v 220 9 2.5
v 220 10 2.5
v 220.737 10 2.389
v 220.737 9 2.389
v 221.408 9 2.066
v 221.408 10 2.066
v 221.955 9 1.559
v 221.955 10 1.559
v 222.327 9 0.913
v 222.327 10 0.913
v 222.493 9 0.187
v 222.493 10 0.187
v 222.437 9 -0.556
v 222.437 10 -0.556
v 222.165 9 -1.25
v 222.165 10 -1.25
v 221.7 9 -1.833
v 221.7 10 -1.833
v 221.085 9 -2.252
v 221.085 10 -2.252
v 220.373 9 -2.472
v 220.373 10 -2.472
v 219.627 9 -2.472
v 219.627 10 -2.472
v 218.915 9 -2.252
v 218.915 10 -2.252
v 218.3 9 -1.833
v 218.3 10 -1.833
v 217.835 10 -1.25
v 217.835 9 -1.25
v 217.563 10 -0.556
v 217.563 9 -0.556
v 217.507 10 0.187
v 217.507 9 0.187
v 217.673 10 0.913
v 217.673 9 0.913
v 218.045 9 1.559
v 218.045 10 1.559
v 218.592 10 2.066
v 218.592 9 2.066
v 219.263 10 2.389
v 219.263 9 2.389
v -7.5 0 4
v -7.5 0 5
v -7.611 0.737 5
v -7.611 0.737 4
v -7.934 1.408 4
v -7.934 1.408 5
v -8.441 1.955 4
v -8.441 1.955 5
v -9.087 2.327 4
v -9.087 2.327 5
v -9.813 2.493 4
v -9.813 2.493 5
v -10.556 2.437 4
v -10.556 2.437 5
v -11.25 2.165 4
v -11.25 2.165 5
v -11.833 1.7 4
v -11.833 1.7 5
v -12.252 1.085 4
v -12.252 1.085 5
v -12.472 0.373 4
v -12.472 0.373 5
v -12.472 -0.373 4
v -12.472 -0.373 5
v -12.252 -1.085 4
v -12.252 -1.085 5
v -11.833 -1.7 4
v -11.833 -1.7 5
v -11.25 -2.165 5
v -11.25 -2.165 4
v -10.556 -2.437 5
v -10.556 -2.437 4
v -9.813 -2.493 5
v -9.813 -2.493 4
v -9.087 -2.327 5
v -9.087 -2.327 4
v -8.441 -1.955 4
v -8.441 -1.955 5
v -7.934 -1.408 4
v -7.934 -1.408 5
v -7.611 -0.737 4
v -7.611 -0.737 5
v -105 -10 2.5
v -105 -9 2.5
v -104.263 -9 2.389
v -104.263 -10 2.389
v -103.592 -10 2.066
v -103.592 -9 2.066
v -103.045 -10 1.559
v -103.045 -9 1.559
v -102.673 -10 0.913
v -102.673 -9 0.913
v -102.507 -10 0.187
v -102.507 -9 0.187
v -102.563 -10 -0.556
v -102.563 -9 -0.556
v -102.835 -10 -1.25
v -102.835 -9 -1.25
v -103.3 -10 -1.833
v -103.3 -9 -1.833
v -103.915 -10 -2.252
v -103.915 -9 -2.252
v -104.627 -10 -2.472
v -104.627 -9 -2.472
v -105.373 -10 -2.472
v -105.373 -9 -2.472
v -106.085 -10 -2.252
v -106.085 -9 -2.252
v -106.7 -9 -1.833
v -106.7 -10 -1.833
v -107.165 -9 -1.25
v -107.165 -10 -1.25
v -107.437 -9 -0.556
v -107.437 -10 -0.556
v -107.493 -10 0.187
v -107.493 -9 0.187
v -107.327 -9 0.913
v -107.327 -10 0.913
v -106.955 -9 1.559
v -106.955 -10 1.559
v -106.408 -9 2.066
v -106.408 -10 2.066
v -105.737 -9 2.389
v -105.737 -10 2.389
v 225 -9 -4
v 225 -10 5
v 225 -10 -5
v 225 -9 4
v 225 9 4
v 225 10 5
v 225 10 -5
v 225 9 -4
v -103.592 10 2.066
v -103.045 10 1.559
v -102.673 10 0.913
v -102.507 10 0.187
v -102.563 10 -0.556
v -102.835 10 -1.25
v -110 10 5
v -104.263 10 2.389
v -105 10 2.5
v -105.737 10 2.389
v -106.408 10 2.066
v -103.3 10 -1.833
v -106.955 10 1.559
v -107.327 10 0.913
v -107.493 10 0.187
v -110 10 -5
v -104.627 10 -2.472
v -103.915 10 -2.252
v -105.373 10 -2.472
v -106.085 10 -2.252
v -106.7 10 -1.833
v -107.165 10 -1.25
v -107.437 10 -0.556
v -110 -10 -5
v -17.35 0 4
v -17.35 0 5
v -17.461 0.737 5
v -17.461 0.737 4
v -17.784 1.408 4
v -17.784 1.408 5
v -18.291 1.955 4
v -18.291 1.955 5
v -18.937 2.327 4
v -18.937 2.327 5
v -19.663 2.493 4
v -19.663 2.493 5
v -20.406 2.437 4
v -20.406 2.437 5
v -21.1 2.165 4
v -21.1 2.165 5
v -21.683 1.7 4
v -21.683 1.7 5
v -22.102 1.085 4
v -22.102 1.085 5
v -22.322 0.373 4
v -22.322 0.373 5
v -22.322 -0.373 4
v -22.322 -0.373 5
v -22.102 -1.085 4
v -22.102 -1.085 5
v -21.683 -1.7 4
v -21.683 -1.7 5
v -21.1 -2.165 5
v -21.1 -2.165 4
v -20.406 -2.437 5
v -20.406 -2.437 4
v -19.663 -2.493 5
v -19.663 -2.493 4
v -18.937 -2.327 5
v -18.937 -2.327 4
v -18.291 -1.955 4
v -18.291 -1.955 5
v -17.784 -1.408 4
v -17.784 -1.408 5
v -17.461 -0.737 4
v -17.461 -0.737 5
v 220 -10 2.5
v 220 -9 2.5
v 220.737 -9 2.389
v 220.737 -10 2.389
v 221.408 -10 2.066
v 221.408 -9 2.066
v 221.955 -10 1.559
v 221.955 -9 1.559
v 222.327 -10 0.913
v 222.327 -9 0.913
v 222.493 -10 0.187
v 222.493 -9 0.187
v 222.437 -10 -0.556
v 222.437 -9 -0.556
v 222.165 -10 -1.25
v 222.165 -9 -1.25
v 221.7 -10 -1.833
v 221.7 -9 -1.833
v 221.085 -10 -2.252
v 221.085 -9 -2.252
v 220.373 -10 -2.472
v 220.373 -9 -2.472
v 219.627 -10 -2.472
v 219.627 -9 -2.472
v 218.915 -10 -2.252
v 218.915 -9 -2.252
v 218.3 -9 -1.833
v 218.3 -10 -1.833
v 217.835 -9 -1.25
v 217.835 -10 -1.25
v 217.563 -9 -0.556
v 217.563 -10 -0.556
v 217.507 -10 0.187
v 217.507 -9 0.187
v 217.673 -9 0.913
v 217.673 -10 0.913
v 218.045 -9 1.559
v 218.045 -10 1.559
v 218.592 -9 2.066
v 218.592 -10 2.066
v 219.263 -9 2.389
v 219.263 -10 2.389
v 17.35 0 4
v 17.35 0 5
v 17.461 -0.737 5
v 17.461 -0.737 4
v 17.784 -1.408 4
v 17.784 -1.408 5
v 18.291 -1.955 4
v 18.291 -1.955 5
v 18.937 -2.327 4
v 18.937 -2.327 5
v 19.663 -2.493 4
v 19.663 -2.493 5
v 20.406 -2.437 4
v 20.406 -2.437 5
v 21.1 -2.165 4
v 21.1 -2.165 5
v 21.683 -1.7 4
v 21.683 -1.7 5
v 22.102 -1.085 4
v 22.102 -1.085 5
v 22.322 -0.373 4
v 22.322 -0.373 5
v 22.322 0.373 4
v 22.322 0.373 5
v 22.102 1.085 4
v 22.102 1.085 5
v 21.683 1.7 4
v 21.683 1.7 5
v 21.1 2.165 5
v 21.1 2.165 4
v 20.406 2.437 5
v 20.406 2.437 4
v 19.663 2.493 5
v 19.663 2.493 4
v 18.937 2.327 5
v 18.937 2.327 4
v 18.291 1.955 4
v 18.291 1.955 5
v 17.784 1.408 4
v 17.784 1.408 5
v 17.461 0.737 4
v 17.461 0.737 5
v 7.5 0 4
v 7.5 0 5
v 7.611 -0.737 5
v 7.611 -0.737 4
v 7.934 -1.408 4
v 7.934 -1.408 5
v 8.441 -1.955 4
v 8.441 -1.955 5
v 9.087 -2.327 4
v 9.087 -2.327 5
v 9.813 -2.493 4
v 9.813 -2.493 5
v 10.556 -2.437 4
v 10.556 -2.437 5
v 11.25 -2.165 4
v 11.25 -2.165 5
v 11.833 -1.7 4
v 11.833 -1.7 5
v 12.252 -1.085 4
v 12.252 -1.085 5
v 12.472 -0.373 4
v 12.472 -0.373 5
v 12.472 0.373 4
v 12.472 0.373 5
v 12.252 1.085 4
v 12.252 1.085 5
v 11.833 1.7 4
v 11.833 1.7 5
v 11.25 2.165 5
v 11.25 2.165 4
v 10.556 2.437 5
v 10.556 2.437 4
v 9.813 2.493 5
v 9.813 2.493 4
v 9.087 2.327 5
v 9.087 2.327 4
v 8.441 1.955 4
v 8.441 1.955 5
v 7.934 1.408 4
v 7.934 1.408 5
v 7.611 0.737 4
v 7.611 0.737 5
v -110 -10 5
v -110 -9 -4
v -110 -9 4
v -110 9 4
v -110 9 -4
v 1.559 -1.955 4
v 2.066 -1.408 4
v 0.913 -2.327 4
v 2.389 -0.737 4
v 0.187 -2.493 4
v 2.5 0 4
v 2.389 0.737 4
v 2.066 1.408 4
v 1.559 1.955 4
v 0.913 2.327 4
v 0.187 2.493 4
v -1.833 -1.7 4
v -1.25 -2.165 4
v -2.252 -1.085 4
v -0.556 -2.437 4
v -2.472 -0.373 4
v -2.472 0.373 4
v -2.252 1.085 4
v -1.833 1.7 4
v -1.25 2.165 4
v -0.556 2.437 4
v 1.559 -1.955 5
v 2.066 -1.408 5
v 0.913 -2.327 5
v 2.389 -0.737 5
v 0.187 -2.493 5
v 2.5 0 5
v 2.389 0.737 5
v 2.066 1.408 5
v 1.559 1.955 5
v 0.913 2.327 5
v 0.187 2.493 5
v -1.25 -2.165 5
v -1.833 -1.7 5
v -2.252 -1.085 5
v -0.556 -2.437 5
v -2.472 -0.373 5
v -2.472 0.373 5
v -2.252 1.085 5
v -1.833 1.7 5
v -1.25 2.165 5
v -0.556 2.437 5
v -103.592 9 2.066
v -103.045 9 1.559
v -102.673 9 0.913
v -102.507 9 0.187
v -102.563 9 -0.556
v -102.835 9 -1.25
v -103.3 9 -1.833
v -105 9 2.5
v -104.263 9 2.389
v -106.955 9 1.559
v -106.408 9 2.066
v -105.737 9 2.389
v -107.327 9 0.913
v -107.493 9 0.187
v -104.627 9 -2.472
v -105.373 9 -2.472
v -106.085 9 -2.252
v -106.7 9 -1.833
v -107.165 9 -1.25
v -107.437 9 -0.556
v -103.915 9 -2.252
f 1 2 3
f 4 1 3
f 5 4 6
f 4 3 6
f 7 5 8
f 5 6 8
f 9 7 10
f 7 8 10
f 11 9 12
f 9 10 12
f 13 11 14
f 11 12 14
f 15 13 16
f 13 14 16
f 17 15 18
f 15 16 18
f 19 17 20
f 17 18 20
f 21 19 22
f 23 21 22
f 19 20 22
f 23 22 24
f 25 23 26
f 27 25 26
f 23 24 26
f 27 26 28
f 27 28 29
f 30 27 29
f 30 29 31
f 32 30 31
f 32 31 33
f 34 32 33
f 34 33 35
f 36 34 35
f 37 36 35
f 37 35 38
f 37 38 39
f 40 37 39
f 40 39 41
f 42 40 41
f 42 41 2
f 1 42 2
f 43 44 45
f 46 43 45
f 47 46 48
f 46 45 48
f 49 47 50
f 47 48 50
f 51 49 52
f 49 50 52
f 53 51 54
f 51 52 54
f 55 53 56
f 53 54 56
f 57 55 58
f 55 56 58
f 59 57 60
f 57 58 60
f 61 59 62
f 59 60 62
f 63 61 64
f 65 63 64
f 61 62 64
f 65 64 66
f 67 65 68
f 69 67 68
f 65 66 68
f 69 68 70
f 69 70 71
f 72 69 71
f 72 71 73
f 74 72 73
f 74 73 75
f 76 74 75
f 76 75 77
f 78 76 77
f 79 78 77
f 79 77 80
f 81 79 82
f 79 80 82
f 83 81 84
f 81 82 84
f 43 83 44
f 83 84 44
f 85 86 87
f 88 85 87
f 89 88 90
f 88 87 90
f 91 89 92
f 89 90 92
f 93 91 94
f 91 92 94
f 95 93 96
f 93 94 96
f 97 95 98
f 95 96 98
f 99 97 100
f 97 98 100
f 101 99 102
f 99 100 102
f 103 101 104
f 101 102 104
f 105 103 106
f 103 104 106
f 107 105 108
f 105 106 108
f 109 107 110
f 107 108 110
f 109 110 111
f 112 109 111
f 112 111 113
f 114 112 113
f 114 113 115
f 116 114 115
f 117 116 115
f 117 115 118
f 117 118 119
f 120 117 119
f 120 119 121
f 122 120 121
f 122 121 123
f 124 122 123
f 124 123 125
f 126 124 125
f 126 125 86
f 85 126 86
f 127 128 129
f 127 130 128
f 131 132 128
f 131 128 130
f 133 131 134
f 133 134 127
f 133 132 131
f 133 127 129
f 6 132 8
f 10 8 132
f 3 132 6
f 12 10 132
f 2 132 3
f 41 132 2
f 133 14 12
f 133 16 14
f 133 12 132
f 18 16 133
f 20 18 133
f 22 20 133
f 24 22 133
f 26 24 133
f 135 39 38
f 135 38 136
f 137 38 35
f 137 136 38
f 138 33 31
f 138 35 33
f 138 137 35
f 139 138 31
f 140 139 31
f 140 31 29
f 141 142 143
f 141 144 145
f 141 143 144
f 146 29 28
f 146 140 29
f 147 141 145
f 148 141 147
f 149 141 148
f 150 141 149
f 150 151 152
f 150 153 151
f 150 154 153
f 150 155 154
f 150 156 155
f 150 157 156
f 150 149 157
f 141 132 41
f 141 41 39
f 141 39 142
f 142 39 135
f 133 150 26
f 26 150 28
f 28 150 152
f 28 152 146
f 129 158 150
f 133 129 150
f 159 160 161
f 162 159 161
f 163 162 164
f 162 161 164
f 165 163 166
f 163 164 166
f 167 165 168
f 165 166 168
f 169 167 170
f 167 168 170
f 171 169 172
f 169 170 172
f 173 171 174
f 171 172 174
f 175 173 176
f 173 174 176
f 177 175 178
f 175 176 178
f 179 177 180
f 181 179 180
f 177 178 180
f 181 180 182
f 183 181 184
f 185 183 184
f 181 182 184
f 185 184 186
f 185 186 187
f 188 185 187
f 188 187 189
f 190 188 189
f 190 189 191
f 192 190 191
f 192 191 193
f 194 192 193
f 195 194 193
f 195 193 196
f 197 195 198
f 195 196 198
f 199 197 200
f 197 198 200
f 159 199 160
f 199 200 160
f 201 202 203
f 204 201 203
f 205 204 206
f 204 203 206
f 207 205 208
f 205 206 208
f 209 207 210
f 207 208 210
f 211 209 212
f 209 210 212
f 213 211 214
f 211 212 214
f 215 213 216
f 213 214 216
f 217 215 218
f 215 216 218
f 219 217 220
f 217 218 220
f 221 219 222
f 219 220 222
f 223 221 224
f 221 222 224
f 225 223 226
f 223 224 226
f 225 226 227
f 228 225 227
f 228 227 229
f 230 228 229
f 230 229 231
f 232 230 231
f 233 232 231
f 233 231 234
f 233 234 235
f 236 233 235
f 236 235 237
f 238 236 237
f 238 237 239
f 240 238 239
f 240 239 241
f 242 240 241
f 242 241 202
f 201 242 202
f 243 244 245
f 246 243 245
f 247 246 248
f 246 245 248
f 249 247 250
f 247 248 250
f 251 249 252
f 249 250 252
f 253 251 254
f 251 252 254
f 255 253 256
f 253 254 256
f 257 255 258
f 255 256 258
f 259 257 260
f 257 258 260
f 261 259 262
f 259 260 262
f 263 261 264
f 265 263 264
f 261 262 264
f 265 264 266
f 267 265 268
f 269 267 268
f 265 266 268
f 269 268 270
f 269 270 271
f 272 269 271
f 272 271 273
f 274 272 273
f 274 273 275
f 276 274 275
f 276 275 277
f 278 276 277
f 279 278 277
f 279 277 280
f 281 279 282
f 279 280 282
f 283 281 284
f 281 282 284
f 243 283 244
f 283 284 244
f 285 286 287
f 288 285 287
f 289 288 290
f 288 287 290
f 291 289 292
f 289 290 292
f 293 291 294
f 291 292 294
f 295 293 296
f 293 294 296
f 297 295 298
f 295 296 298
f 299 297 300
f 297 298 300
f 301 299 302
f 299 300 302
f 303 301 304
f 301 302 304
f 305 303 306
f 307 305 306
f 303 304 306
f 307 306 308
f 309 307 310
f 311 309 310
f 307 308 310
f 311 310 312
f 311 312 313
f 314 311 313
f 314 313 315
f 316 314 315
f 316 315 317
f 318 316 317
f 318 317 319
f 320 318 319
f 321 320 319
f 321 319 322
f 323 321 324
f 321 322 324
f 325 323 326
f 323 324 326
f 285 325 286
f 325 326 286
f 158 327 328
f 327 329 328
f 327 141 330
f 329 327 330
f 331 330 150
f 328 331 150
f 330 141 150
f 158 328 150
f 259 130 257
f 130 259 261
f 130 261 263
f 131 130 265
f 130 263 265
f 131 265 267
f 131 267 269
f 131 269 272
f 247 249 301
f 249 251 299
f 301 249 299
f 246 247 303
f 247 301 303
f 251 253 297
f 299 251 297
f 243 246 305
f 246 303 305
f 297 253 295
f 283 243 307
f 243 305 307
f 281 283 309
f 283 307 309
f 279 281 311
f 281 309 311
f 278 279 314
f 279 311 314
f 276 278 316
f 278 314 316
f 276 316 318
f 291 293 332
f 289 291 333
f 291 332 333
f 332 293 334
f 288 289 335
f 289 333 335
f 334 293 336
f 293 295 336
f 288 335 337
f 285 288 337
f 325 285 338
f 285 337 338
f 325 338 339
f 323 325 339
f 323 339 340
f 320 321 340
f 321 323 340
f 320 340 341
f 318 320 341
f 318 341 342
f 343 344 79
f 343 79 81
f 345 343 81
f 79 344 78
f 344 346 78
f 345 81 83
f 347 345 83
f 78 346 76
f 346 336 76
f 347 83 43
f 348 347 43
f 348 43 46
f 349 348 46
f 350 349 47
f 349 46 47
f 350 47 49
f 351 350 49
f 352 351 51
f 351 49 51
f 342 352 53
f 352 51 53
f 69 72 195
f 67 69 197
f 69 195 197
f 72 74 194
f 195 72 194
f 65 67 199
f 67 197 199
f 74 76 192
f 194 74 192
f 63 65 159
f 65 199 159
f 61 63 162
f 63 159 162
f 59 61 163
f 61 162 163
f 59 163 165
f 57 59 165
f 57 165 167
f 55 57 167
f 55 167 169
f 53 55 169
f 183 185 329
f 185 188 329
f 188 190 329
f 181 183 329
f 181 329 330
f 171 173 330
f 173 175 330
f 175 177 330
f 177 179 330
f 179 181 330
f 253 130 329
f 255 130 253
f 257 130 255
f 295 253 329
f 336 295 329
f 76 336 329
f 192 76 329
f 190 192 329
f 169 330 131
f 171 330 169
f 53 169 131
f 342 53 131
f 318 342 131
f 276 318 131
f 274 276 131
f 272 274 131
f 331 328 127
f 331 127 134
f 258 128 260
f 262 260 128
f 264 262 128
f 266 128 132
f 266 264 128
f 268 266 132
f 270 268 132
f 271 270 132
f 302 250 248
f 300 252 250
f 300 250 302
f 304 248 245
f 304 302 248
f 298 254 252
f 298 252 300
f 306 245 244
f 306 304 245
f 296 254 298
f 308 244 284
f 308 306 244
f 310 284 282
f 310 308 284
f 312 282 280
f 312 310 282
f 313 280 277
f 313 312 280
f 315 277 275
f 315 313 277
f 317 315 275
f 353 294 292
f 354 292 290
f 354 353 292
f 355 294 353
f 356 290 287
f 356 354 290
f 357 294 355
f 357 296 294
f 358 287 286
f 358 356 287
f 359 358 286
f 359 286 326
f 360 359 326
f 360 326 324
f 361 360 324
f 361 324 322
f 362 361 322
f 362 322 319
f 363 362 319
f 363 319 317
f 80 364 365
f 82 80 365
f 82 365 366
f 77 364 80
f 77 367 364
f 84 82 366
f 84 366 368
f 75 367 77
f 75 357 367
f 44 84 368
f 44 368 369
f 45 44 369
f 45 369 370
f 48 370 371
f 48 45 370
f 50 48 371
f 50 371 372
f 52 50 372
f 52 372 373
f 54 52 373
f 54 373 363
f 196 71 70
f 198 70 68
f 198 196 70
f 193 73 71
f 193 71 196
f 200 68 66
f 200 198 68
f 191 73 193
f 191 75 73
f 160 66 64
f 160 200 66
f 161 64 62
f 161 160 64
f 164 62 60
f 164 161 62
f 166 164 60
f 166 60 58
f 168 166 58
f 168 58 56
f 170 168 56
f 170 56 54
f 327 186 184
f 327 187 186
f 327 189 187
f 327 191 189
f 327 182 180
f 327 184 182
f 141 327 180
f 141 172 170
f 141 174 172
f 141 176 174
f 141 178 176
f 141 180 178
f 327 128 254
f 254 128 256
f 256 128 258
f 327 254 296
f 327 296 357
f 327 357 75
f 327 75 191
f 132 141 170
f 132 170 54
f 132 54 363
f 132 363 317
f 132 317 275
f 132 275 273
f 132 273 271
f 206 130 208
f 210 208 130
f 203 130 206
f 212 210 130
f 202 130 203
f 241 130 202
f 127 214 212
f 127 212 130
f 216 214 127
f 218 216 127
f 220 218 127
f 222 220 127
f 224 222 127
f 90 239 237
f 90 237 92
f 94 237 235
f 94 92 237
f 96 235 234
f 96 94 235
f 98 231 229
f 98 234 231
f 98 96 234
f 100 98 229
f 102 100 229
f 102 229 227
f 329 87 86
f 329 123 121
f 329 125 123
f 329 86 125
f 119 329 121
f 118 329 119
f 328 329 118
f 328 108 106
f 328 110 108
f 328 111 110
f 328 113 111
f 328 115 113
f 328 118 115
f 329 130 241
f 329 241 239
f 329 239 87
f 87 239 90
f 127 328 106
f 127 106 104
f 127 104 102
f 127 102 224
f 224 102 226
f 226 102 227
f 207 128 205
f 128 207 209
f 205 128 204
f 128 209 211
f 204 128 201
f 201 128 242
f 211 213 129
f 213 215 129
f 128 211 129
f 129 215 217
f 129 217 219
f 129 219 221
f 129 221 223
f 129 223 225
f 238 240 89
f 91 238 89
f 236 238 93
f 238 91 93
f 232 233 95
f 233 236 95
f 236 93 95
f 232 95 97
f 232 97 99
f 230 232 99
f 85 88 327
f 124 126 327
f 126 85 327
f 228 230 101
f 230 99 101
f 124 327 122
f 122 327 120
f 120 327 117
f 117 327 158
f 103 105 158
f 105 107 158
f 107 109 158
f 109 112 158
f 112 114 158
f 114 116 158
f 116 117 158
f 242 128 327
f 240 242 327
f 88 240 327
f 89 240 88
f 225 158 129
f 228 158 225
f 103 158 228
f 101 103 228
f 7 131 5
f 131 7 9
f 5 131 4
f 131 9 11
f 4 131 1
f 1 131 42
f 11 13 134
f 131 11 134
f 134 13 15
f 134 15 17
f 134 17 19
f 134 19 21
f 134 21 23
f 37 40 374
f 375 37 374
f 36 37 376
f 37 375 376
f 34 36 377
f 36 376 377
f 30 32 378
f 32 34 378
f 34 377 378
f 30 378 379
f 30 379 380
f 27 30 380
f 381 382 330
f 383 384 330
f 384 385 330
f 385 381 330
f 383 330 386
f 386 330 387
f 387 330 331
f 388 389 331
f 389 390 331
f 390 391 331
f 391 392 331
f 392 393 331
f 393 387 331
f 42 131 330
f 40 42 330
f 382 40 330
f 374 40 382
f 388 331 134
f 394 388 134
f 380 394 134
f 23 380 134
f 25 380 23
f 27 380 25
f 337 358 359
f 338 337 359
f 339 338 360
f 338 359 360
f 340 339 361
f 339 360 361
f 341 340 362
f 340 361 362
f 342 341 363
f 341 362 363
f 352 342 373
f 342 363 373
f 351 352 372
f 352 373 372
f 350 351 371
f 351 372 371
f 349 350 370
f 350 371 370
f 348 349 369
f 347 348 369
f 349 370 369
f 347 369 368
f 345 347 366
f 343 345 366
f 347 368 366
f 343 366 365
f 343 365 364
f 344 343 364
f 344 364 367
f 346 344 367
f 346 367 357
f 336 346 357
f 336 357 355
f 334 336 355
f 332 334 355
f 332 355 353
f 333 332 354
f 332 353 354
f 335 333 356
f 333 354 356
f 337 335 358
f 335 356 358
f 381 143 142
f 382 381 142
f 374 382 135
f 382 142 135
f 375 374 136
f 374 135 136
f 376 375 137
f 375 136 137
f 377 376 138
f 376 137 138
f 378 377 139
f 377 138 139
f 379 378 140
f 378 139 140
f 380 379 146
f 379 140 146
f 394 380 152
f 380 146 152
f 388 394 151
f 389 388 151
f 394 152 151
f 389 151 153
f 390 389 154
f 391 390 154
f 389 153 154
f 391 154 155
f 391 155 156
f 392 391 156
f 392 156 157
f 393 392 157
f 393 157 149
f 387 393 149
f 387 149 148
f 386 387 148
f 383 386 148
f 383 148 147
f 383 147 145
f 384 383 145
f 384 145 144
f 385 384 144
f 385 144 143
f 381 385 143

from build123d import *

# Parameters (mm, degrees)
BOSS_EXTRUDE1_DEPTH      = 225
BOSS_EXTRUDE1_DEPTH_BACK = 110
SKETCH1_W                = 10
SKETCH1_H                = 20
SKETCH1_W_2              = 8
SKETCH1_H_2              = 18
SKETCH2_R                = 2.5
CUT_EXTRUDE1_DEPTH       = 1
SKETCH3_R                = 2.5
CUT_EXTRUDE2_DEPTH       = 20


with BuildPart() as part:
    # Sketch1 → Boss-Extrude1 (new, two sides: drawn at the far end of the back side and taken through both)
    with BuildSketch(Plane(origin=(0, 0, 0), x_dir=(0, 0, -1), z_dir=(1, 0, 0)).offset(-BOSS_EXTRUDE1_DEPTH_BACK)):
        Rectangle(SKETCH1_W, SKETCH1_H)
        Rectangle(SKETCH1_W_2, SKETCH1_H_2, mode=Mode.SUBTRACT)
    extrude(amount=BOSS_EXTRUDE1_DEPTH + BOSS_EXTRUDE1_DEPTH_BACK)

    # Sketch2 → Cut-Extrude1 (cut)
    with BuildSketch(Plane.XY.offset(5)):
        with Locations((-19.85, 0)):
            Circle(SKETCH2_R)
        with Locations((-10, 0)):
            Circle(SKETCH2_R)
        Circle(SKETCH2_R)
        with Locations(Location((19.85, 0, 0), (0, 0, 180))):
            Circle(SKETCH2_R)
        with Locations(Location((10, 0, 0), (0, 0, 180))):
            Circle(SKETCH2_R)
    extrude(amount=-CUT_EXTRUDE1_DEPTH, mode=Mode.SUBTRACT)

    # Sketch3 → Cut-Extrude2 (cut)
    with BuildSketch(Plane(origin=(0, 10, 0), x_dir=(1, 0, 0), z_dir=(0, 1, 0))):
        with Locations(Location((220, 0, 0), (0, 0, 270))):
            Circle(SKETCH3_R)
        with Locations(Location((-105, 0, 0), (0, 0, 270))):
            Circle(SKETCH3_R)
    extrude(amount=-CUT_EXTRUDE2_DEPTH, mode=Mode.SUBTRACT)


solid = part.part
